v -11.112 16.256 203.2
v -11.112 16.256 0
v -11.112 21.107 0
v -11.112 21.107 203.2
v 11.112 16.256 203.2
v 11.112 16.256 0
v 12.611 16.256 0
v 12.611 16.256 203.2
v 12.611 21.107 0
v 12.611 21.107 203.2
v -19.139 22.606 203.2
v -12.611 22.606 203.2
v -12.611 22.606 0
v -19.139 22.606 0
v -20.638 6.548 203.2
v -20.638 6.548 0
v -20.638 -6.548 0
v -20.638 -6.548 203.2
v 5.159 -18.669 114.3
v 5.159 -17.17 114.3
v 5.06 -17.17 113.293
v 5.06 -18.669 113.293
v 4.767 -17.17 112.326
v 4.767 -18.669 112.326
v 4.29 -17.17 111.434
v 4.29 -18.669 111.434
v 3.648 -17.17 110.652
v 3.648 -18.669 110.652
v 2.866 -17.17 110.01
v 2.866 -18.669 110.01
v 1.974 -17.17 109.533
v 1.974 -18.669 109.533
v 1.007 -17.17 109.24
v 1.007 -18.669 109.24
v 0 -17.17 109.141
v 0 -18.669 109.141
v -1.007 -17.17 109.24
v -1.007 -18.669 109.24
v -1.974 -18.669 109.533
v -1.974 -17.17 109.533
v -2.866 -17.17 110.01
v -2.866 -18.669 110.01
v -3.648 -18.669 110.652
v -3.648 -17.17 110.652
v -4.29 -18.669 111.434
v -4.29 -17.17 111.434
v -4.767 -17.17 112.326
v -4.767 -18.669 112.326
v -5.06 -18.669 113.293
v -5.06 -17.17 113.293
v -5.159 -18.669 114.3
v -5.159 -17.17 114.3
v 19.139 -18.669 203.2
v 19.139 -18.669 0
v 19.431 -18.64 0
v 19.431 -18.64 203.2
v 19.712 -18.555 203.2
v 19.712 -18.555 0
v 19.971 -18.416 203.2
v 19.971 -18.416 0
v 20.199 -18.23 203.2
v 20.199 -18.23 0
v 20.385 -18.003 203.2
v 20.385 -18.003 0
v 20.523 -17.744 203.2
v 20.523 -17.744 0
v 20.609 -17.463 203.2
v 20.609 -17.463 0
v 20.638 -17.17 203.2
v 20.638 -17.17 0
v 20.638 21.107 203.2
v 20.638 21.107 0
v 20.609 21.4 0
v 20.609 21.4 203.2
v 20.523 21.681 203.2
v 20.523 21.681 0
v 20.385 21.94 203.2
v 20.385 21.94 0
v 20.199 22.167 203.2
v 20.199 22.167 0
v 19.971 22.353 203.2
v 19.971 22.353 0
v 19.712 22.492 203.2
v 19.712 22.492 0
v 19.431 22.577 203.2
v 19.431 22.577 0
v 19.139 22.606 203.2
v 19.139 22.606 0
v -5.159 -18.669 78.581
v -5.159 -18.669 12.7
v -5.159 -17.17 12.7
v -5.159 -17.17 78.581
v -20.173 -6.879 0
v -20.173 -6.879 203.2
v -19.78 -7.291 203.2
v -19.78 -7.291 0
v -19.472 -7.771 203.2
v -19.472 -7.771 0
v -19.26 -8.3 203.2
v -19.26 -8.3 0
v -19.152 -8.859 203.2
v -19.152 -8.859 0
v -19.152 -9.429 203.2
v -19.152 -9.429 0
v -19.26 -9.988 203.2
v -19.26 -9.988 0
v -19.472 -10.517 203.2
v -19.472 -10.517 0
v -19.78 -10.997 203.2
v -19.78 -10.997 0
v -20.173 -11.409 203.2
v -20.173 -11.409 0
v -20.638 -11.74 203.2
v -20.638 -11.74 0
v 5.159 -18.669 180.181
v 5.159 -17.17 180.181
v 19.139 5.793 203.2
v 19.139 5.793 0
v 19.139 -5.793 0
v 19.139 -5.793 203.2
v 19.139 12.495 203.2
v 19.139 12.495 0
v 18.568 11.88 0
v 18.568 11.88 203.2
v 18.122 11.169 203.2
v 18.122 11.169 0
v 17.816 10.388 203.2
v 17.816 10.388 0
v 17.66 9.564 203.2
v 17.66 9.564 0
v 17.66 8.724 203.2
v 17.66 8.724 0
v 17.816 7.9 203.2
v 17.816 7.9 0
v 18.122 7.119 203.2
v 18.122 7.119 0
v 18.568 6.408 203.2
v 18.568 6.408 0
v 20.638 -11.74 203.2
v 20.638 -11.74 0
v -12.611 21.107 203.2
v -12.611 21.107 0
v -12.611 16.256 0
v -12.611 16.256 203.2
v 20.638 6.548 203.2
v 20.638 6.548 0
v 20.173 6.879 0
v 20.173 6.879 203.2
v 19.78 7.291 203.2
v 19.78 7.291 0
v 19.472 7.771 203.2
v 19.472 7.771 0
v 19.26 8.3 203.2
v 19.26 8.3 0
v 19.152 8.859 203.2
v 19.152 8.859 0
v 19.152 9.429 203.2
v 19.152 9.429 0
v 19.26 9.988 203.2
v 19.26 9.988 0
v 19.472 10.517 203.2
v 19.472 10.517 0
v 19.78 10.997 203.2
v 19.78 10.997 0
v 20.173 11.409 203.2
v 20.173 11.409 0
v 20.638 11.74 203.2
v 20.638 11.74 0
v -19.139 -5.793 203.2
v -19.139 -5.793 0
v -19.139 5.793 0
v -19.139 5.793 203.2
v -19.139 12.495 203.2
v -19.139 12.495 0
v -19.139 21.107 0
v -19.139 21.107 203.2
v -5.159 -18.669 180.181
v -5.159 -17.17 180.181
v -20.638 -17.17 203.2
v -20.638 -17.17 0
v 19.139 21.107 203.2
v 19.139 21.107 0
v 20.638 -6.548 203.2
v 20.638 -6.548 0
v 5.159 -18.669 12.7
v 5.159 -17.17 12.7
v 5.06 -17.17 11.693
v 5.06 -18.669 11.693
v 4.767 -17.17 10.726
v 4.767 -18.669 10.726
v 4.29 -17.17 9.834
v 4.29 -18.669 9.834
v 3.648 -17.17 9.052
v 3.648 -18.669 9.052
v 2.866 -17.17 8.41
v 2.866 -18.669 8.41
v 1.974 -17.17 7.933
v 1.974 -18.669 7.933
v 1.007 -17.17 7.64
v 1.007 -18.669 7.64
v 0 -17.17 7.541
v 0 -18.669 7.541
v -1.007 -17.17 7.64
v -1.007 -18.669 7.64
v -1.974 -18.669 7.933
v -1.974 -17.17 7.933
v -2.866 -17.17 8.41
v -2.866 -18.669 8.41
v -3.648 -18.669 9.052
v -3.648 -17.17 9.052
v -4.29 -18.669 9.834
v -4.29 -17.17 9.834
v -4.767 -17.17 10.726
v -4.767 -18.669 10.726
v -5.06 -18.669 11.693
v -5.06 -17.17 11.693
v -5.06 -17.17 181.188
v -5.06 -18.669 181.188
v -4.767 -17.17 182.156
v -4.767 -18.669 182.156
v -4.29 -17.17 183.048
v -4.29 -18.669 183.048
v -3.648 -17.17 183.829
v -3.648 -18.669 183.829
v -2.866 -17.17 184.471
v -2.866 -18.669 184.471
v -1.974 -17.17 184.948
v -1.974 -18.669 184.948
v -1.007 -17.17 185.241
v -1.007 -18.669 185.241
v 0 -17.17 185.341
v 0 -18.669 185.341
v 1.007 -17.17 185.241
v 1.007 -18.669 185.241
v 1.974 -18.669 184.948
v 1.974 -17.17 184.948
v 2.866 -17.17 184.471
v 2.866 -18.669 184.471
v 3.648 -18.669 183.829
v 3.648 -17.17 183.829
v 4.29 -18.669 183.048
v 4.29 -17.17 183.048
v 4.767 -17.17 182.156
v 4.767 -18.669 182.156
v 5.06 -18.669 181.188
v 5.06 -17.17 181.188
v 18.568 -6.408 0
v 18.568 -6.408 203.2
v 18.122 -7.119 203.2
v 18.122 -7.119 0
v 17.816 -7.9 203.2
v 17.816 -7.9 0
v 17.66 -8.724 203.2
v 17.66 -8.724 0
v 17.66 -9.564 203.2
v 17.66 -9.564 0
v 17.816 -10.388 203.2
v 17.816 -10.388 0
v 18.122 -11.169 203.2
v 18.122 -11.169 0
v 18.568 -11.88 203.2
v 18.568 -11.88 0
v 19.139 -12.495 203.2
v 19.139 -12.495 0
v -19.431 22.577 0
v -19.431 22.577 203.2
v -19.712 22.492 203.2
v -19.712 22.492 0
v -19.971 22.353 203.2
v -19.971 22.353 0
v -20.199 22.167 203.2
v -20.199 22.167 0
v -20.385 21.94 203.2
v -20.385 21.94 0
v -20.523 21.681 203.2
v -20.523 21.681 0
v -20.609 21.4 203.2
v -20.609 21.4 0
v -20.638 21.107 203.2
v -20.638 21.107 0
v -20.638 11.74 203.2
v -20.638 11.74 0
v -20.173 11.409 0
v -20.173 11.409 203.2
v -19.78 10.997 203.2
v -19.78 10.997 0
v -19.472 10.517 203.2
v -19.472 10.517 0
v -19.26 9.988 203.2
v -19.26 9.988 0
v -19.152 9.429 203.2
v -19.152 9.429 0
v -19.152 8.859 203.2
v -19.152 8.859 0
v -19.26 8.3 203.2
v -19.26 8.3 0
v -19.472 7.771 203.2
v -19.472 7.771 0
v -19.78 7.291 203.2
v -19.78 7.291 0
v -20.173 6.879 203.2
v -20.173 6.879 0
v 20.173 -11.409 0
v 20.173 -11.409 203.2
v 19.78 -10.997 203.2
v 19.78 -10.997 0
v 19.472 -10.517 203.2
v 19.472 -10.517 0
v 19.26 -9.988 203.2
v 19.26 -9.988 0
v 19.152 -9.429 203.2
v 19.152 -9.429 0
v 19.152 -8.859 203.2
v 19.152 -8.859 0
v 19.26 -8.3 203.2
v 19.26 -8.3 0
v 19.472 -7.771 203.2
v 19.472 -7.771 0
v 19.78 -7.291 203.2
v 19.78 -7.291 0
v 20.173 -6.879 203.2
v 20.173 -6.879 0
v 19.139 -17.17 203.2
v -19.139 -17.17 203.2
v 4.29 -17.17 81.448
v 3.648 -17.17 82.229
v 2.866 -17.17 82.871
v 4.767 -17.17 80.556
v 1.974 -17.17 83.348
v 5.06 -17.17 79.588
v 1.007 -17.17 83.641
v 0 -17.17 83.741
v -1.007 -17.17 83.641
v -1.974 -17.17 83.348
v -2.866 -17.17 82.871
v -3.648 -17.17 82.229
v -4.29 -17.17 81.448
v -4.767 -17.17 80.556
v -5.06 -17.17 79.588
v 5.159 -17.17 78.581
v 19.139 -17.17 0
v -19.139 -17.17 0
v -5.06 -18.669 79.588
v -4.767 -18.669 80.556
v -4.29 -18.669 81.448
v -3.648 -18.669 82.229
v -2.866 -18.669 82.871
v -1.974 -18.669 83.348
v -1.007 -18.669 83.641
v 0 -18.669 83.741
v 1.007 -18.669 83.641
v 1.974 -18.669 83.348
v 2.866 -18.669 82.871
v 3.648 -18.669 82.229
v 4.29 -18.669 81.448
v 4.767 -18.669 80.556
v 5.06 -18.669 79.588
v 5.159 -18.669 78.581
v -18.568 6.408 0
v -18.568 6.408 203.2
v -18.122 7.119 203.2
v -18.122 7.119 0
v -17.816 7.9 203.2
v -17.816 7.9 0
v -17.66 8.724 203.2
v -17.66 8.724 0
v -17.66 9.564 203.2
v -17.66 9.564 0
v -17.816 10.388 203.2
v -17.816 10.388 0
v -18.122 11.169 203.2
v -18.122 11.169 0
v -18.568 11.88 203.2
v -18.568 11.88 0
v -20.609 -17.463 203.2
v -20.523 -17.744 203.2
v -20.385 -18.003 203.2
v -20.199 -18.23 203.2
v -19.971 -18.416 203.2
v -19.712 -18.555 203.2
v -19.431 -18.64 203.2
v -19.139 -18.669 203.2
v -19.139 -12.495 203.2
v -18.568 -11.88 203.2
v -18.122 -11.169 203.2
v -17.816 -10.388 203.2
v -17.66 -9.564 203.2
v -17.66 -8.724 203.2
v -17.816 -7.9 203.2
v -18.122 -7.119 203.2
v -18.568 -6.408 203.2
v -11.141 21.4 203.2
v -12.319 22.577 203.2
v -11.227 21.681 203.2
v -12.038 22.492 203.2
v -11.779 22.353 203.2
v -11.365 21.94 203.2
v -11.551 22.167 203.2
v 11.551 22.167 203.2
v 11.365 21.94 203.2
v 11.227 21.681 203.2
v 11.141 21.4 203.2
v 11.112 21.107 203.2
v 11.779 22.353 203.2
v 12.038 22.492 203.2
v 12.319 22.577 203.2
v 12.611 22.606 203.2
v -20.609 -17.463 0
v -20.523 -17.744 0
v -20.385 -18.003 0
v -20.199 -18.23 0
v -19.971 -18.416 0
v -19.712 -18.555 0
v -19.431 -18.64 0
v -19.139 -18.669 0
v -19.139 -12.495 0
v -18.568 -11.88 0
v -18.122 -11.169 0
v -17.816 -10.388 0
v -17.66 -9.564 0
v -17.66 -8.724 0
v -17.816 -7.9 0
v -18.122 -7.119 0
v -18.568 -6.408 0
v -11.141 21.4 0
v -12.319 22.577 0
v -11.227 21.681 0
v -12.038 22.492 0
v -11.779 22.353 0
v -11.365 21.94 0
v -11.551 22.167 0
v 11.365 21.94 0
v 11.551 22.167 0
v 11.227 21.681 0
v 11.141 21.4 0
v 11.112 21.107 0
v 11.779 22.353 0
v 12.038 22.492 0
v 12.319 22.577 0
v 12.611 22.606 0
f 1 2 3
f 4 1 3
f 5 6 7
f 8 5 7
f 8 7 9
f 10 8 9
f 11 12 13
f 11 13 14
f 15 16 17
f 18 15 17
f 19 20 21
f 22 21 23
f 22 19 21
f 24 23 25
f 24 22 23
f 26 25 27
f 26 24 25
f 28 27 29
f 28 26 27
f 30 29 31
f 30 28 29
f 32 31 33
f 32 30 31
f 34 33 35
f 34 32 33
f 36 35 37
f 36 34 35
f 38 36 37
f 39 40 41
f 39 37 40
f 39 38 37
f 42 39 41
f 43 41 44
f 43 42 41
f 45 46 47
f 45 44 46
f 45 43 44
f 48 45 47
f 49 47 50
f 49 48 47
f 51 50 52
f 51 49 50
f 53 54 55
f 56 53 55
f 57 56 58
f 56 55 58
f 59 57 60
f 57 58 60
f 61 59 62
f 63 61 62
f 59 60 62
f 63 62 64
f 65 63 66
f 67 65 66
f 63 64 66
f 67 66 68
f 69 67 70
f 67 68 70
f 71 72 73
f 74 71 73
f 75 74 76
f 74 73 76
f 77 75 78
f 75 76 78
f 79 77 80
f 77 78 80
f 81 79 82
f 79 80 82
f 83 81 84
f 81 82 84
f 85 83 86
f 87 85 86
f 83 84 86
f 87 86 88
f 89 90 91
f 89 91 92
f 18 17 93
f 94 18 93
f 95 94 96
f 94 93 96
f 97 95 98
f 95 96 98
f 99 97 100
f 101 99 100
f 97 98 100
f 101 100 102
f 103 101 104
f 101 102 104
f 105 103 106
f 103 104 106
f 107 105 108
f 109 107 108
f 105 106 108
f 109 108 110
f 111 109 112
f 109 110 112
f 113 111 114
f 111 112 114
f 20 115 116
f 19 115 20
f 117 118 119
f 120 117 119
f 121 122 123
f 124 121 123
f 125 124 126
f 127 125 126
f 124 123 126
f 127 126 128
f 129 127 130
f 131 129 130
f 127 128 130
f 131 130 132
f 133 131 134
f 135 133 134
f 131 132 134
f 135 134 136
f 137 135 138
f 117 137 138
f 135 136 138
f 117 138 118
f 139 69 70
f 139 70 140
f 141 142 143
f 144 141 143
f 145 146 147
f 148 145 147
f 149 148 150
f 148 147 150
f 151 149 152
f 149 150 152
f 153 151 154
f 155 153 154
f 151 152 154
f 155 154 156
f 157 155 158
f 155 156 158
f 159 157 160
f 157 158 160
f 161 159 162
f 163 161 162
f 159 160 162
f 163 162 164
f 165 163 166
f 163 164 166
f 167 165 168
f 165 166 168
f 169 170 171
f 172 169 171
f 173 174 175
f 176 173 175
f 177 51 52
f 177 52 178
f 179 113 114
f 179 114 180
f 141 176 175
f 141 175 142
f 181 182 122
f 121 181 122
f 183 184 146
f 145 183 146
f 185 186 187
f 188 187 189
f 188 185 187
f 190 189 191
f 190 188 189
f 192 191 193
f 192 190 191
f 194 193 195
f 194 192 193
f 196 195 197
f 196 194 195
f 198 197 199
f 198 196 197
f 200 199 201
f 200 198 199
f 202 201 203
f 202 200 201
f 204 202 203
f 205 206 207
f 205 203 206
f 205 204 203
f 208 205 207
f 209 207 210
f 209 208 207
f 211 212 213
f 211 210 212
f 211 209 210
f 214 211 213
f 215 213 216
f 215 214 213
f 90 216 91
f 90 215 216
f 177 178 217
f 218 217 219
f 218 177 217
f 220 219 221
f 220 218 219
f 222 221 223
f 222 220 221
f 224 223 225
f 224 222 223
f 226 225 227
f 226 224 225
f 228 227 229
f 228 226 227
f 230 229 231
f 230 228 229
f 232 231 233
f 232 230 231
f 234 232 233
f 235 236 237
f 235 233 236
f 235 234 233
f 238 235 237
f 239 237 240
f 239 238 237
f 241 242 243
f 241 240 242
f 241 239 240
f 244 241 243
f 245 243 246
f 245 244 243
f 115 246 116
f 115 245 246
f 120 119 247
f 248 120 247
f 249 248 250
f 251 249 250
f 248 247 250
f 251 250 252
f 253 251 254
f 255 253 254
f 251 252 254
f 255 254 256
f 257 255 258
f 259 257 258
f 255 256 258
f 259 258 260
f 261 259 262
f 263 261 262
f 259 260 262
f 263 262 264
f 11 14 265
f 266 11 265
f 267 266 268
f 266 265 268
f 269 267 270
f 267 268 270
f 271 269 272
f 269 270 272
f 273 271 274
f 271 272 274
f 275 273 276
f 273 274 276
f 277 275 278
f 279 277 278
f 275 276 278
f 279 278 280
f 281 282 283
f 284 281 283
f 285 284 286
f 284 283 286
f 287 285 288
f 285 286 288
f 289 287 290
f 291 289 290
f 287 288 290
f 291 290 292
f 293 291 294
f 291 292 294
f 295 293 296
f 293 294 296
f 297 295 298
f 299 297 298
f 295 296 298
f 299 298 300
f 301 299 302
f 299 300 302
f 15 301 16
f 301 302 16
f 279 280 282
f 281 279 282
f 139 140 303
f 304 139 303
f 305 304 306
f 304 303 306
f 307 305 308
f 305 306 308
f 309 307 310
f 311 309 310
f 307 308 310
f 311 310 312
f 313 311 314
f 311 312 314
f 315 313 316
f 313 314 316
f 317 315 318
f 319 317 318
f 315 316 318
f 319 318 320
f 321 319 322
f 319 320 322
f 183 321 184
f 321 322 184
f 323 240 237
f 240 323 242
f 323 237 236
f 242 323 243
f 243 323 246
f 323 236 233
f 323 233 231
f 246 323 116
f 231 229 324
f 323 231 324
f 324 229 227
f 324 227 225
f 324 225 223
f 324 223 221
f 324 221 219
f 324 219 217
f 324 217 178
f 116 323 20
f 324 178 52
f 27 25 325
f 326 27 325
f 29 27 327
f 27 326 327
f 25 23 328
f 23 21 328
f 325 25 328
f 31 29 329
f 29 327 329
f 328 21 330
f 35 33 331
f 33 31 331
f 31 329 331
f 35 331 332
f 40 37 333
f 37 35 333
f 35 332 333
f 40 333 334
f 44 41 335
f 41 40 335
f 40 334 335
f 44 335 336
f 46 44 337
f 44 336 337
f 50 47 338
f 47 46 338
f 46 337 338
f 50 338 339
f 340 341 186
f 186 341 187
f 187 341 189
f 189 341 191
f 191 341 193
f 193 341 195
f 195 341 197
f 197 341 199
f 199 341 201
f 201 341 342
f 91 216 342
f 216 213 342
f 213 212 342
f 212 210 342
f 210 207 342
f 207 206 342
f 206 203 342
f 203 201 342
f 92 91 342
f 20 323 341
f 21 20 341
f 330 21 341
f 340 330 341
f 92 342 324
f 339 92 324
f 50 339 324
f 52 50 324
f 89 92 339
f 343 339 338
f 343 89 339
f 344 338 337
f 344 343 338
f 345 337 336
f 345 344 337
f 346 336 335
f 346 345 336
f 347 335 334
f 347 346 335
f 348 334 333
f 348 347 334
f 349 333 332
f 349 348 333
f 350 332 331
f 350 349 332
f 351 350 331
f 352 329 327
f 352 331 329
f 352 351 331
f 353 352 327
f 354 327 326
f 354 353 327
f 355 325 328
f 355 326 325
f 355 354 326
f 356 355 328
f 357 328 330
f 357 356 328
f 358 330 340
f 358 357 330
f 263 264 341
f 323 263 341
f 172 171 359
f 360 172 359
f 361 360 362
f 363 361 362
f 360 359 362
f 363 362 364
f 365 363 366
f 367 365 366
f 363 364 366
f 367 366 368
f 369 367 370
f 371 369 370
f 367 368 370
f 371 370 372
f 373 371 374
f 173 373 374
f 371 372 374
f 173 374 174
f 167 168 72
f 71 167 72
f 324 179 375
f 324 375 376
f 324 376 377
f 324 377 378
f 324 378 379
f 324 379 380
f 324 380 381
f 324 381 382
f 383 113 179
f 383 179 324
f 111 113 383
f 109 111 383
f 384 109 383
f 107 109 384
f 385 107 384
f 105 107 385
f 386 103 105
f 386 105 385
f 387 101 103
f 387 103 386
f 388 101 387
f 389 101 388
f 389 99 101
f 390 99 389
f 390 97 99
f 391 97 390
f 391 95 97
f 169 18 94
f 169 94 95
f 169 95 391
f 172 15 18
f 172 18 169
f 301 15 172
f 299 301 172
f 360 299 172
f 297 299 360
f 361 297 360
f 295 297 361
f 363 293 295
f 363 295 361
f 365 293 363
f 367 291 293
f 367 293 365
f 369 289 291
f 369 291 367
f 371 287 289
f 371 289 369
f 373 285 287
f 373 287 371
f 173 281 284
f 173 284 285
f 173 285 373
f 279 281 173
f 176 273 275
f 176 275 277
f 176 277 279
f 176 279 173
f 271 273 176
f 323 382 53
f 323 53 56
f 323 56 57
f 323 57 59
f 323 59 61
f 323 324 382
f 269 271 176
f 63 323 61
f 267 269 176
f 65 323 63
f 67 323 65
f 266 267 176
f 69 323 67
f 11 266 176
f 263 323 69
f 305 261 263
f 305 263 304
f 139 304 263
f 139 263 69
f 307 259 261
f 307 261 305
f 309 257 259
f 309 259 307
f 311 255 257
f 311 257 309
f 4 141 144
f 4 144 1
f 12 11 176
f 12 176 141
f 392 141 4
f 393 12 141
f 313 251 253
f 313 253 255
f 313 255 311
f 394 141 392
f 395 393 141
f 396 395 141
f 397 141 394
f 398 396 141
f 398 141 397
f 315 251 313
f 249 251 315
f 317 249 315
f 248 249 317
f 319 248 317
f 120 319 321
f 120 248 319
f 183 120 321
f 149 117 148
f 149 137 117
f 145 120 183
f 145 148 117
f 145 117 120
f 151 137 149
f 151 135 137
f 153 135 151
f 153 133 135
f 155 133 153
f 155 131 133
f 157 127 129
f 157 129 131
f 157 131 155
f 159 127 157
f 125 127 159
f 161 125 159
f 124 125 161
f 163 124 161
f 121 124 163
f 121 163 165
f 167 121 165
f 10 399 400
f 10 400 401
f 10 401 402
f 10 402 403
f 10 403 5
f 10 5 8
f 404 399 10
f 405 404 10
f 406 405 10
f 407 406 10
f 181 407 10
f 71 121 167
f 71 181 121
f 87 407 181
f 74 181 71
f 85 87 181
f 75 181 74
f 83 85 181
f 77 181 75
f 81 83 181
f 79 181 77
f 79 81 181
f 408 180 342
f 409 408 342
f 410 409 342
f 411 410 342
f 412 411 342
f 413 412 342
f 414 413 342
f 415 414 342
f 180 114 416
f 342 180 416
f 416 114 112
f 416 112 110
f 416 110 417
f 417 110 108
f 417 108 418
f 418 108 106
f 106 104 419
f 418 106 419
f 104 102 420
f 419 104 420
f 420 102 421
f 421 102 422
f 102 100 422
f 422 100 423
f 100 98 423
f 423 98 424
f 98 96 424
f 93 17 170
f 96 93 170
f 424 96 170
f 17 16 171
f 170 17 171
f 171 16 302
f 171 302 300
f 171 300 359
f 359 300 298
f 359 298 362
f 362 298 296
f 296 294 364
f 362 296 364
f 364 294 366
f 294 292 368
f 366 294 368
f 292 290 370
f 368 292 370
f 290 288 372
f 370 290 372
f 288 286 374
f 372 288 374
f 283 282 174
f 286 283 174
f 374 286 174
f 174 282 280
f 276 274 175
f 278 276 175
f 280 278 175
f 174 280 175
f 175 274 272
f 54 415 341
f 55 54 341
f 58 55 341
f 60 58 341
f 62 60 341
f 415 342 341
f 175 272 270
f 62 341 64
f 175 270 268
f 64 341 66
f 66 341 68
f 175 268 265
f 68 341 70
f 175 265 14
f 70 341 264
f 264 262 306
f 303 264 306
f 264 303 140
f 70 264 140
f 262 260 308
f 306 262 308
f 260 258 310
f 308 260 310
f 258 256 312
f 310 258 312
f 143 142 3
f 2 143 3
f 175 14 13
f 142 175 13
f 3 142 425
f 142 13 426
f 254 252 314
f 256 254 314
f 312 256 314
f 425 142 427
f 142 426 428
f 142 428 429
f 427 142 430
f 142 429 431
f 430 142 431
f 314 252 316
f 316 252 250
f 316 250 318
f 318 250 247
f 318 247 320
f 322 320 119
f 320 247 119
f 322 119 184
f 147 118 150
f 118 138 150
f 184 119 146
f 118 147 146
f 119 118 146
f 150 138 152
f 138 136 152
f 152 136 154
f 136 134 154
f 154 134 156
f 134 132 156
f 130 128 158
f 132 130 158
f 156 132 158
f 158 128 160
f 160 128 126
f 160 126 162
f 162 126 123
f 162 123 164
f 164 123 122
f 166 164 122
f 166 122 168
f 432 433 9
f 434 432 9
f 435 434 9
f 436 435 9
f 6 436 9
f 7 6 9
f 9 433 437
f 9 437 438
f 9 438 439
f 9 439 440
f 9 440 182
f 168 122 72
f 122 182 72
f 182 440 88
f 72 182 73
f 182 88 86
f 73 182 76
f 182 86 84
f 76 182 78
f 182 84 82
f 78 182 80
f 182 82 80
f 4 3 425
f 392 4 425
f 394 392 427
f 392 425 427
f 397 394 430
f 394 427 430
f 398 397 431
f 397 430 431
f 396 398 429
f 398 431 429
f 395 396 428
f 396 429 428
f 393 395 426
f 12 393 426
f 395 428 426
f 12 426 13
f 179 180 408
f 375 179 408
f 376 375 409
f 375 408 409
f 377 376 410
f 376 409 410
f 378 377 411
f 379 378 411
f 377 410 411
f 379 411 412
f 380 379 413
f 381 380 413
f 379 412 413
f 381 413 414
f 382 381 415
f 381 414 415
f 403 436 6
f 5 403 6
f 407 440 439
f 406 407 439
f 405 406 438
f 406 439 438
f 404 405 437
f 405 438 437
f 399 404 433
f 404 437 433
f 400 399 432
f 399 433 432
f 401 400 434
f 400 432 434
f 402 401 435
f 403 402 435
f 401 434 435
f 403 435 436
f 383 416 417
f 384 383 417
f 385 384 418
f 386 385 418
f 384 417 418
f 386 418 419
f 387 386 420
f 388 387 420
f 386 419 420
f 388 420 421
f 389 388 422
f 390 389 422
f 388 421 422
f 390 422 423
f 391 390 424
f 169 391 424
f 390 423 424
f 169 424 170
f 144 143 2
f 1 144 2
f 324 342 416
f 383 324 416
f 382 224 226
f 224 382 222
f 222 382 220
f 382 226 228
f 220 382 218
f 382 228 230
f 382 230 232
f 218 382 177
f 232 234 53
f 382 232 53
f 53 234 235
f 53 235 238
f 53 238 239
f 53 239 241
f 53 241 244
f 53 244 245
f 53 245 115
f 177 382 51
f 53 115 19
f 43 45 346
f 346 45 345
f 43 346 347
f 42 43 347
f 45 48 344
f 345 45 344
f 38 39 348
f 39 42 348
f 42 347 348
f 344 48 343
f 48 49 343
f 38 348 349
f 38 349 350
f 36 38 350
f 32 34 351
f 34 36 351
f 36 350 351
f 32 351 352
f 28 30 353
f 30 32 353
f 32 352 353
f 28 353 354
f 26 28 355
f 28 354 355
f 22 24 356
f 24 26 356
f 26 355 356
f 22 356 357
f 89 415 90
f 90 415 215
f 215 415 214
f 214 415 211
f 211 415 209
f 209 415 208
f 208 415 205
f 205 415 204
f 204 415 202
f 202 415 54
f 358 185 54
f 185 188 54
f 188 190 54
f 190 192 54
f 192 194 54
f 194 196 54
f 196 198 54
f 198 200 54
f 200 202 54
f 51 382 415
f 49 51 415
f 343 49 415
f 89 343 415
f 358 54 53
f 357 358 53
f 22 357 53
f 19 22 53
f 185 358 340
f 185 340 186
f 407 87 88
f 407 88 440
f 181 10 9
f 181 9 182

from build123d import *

# Parameters (mm, degrees)
BASE_EXTRUDE_DEPTH = 203.2
SLOT_DEPTH         = 227.830922417
LPATTERN1_COUNT    = 2
LPATTERN1_PITCH    = 101.6


with BuildPart() as part:
    # Sketch1 → Base-Extrude (new body)
    with BuildSketch(Plane.XY):
        with BuildLine():
            Line((-20.6375, 21.1074), (-20.6375, 11.73965134))
            ThreePointArc((-20.6375, 11.73965134), (-19.1389, 9.144), (-20.6375, 6.54834866))
            Line((-20.6375, 6.54834866), (-20.6375, -6.54834866))
            ThreePointArc((-20.6375, -6.54834866), (-19.1389, -9.144), (-20.6375, -11.73965134))
            Line((-20.6375, -11.73965134), (-20.6375, -17.1704))
            ThreePointArc((-20.6375, -17.1704), (-20.198570222, -18.230070222), (-19.1389, -18.669))
            Line((-19.1389, -18.669), (19.1389, -18.669))
            ThreePointArc((19.1389, -18.669), (20.198570222, -18.230070222), (20.6375, -17.1704))
            Line((20.6375, -17.1704), (20.6375, -11.73965134))
            ThreePointArc((20.6375, -11.73965134), (19.1389, -9.144), (20.6375, -6.54834866))
            Line((20.6375, -6.54834866), (20.6375, 6.54834866))
            ThreePointArc((20.6375, 6.54834866), (19.1389, 9.144), (20.6375, 11.73965134))
            Line((20.6375, 11.73965134), (20.6375, 21.1074))
            ThreePointArc((20.6375, 21.1074), (20.198570222, 22.167070222), (19.1389, 22.606))
            Line((19.1389, 22.606), (12.6111, 22.606))
            ThreePointArc((12.6111, 22.606), (11.551429778, 22.167070222), (11.1125, 21.1074))
            Line((11.1125, 21.1074), (11.1125, 16.256))
            Line((11.1125, 16.256), (12.6111, 16.256))
            Line((12.6111, 16.256), (12.6111, 21.1074))
            Line((12.6111, 21.1074), (19.1389, 21.1074))
            Line((19.1389, 21.1074), (19.1389, 12.494971471))
            ThreePointArc((19.1389, 12.494971471), (17.6403, 9.144), (19.1389, 5.793028529))
            Line((19.1389, 5.793028529), (19.1389, -5.793028529))
            ThreePointArc((19.1389, -5.793028529), (17.6403, -9.144), (19.1389, -12.494971471))
            Line((19.1389, -12.494971471), (19.1389, -17.1704))
            Line((19.1389, -17.1704), (-19.1389, -17.1704))
            Line((-19.1389, -17.1704), (-19.1389, -12.494971471))
            ThreePointArc((-19.1389, -12.494971471), (-17.6403, -9.144), (-19.1389, -5.793028529))
            Line((-19.1389, -5.793028529), (-19.1389, 5.793028529))
            ThreePointArc((-19.1389, 5.793028529), (-17.6403, 9.144), (-19.1389, 12.494971471))
            Line((-19.1389, 12.494971471), (-19.1389, 21.1074))
            Line((-19.1389, 21.1074), (-12.6111, 21.1074))
            Line((-12.6111, 21.1074), (-12.6111, 16.256))
            Line((-12.6111, 16.256), (-11.1125, 16.256))
            Line((-11.1125, 16.256), (-11.1125, 21.1074))
            ThreePointArc((-11.1125, 21.1074), (-11.551429778, 22.167070222), (-12.6111, 22.606))
            Line((-12.6111, 22.606), (-19.1389, 22.606))
            ThreePointArc((-19.1389, 22.606), (-20.198570222, 22.167070222), (-20.6375, 21.1074))
        make_face()
    extrude(amount=BASE_EXTRUDE_DEPTH)

    # Sketch2 → Slot (cut, through all)
    with BuildSketch(Plane(origin=(1.121412804, -18.669, -18.780160044), x_dir=(1, 0, 0), z_dir=(0, -1, 0))):
        with BuildLine():
            Line((4.037962196, 97.361410044), (4.037962196, 31.480160044))
            ThreePointArc((4.037962196, 31.480160044), (-1.121412804, 26.320785044), (-6.280787804, 31.480160044))
            Line((-6.280787804, 31.480160044), (-6.280787804, 97.361410044))
            ThreePointArc((-6.280787804, 97.361410044), (-1.121412804, 102.520785044), (4.037962196, 97.361410044))
        make_face()
    slot = extrude(amount=-SLOT_DEPTH, mode=Mode.SUBTRACT)

    # LPattern1: Slot ×2
    with Locations(*[(0, 0, i * LPATTERN1_PITCH) for i in range(1, LPATTERN1_COUNT)]):
        add(slot, mode=Mode.SUBTRACT)


solid = part.part
